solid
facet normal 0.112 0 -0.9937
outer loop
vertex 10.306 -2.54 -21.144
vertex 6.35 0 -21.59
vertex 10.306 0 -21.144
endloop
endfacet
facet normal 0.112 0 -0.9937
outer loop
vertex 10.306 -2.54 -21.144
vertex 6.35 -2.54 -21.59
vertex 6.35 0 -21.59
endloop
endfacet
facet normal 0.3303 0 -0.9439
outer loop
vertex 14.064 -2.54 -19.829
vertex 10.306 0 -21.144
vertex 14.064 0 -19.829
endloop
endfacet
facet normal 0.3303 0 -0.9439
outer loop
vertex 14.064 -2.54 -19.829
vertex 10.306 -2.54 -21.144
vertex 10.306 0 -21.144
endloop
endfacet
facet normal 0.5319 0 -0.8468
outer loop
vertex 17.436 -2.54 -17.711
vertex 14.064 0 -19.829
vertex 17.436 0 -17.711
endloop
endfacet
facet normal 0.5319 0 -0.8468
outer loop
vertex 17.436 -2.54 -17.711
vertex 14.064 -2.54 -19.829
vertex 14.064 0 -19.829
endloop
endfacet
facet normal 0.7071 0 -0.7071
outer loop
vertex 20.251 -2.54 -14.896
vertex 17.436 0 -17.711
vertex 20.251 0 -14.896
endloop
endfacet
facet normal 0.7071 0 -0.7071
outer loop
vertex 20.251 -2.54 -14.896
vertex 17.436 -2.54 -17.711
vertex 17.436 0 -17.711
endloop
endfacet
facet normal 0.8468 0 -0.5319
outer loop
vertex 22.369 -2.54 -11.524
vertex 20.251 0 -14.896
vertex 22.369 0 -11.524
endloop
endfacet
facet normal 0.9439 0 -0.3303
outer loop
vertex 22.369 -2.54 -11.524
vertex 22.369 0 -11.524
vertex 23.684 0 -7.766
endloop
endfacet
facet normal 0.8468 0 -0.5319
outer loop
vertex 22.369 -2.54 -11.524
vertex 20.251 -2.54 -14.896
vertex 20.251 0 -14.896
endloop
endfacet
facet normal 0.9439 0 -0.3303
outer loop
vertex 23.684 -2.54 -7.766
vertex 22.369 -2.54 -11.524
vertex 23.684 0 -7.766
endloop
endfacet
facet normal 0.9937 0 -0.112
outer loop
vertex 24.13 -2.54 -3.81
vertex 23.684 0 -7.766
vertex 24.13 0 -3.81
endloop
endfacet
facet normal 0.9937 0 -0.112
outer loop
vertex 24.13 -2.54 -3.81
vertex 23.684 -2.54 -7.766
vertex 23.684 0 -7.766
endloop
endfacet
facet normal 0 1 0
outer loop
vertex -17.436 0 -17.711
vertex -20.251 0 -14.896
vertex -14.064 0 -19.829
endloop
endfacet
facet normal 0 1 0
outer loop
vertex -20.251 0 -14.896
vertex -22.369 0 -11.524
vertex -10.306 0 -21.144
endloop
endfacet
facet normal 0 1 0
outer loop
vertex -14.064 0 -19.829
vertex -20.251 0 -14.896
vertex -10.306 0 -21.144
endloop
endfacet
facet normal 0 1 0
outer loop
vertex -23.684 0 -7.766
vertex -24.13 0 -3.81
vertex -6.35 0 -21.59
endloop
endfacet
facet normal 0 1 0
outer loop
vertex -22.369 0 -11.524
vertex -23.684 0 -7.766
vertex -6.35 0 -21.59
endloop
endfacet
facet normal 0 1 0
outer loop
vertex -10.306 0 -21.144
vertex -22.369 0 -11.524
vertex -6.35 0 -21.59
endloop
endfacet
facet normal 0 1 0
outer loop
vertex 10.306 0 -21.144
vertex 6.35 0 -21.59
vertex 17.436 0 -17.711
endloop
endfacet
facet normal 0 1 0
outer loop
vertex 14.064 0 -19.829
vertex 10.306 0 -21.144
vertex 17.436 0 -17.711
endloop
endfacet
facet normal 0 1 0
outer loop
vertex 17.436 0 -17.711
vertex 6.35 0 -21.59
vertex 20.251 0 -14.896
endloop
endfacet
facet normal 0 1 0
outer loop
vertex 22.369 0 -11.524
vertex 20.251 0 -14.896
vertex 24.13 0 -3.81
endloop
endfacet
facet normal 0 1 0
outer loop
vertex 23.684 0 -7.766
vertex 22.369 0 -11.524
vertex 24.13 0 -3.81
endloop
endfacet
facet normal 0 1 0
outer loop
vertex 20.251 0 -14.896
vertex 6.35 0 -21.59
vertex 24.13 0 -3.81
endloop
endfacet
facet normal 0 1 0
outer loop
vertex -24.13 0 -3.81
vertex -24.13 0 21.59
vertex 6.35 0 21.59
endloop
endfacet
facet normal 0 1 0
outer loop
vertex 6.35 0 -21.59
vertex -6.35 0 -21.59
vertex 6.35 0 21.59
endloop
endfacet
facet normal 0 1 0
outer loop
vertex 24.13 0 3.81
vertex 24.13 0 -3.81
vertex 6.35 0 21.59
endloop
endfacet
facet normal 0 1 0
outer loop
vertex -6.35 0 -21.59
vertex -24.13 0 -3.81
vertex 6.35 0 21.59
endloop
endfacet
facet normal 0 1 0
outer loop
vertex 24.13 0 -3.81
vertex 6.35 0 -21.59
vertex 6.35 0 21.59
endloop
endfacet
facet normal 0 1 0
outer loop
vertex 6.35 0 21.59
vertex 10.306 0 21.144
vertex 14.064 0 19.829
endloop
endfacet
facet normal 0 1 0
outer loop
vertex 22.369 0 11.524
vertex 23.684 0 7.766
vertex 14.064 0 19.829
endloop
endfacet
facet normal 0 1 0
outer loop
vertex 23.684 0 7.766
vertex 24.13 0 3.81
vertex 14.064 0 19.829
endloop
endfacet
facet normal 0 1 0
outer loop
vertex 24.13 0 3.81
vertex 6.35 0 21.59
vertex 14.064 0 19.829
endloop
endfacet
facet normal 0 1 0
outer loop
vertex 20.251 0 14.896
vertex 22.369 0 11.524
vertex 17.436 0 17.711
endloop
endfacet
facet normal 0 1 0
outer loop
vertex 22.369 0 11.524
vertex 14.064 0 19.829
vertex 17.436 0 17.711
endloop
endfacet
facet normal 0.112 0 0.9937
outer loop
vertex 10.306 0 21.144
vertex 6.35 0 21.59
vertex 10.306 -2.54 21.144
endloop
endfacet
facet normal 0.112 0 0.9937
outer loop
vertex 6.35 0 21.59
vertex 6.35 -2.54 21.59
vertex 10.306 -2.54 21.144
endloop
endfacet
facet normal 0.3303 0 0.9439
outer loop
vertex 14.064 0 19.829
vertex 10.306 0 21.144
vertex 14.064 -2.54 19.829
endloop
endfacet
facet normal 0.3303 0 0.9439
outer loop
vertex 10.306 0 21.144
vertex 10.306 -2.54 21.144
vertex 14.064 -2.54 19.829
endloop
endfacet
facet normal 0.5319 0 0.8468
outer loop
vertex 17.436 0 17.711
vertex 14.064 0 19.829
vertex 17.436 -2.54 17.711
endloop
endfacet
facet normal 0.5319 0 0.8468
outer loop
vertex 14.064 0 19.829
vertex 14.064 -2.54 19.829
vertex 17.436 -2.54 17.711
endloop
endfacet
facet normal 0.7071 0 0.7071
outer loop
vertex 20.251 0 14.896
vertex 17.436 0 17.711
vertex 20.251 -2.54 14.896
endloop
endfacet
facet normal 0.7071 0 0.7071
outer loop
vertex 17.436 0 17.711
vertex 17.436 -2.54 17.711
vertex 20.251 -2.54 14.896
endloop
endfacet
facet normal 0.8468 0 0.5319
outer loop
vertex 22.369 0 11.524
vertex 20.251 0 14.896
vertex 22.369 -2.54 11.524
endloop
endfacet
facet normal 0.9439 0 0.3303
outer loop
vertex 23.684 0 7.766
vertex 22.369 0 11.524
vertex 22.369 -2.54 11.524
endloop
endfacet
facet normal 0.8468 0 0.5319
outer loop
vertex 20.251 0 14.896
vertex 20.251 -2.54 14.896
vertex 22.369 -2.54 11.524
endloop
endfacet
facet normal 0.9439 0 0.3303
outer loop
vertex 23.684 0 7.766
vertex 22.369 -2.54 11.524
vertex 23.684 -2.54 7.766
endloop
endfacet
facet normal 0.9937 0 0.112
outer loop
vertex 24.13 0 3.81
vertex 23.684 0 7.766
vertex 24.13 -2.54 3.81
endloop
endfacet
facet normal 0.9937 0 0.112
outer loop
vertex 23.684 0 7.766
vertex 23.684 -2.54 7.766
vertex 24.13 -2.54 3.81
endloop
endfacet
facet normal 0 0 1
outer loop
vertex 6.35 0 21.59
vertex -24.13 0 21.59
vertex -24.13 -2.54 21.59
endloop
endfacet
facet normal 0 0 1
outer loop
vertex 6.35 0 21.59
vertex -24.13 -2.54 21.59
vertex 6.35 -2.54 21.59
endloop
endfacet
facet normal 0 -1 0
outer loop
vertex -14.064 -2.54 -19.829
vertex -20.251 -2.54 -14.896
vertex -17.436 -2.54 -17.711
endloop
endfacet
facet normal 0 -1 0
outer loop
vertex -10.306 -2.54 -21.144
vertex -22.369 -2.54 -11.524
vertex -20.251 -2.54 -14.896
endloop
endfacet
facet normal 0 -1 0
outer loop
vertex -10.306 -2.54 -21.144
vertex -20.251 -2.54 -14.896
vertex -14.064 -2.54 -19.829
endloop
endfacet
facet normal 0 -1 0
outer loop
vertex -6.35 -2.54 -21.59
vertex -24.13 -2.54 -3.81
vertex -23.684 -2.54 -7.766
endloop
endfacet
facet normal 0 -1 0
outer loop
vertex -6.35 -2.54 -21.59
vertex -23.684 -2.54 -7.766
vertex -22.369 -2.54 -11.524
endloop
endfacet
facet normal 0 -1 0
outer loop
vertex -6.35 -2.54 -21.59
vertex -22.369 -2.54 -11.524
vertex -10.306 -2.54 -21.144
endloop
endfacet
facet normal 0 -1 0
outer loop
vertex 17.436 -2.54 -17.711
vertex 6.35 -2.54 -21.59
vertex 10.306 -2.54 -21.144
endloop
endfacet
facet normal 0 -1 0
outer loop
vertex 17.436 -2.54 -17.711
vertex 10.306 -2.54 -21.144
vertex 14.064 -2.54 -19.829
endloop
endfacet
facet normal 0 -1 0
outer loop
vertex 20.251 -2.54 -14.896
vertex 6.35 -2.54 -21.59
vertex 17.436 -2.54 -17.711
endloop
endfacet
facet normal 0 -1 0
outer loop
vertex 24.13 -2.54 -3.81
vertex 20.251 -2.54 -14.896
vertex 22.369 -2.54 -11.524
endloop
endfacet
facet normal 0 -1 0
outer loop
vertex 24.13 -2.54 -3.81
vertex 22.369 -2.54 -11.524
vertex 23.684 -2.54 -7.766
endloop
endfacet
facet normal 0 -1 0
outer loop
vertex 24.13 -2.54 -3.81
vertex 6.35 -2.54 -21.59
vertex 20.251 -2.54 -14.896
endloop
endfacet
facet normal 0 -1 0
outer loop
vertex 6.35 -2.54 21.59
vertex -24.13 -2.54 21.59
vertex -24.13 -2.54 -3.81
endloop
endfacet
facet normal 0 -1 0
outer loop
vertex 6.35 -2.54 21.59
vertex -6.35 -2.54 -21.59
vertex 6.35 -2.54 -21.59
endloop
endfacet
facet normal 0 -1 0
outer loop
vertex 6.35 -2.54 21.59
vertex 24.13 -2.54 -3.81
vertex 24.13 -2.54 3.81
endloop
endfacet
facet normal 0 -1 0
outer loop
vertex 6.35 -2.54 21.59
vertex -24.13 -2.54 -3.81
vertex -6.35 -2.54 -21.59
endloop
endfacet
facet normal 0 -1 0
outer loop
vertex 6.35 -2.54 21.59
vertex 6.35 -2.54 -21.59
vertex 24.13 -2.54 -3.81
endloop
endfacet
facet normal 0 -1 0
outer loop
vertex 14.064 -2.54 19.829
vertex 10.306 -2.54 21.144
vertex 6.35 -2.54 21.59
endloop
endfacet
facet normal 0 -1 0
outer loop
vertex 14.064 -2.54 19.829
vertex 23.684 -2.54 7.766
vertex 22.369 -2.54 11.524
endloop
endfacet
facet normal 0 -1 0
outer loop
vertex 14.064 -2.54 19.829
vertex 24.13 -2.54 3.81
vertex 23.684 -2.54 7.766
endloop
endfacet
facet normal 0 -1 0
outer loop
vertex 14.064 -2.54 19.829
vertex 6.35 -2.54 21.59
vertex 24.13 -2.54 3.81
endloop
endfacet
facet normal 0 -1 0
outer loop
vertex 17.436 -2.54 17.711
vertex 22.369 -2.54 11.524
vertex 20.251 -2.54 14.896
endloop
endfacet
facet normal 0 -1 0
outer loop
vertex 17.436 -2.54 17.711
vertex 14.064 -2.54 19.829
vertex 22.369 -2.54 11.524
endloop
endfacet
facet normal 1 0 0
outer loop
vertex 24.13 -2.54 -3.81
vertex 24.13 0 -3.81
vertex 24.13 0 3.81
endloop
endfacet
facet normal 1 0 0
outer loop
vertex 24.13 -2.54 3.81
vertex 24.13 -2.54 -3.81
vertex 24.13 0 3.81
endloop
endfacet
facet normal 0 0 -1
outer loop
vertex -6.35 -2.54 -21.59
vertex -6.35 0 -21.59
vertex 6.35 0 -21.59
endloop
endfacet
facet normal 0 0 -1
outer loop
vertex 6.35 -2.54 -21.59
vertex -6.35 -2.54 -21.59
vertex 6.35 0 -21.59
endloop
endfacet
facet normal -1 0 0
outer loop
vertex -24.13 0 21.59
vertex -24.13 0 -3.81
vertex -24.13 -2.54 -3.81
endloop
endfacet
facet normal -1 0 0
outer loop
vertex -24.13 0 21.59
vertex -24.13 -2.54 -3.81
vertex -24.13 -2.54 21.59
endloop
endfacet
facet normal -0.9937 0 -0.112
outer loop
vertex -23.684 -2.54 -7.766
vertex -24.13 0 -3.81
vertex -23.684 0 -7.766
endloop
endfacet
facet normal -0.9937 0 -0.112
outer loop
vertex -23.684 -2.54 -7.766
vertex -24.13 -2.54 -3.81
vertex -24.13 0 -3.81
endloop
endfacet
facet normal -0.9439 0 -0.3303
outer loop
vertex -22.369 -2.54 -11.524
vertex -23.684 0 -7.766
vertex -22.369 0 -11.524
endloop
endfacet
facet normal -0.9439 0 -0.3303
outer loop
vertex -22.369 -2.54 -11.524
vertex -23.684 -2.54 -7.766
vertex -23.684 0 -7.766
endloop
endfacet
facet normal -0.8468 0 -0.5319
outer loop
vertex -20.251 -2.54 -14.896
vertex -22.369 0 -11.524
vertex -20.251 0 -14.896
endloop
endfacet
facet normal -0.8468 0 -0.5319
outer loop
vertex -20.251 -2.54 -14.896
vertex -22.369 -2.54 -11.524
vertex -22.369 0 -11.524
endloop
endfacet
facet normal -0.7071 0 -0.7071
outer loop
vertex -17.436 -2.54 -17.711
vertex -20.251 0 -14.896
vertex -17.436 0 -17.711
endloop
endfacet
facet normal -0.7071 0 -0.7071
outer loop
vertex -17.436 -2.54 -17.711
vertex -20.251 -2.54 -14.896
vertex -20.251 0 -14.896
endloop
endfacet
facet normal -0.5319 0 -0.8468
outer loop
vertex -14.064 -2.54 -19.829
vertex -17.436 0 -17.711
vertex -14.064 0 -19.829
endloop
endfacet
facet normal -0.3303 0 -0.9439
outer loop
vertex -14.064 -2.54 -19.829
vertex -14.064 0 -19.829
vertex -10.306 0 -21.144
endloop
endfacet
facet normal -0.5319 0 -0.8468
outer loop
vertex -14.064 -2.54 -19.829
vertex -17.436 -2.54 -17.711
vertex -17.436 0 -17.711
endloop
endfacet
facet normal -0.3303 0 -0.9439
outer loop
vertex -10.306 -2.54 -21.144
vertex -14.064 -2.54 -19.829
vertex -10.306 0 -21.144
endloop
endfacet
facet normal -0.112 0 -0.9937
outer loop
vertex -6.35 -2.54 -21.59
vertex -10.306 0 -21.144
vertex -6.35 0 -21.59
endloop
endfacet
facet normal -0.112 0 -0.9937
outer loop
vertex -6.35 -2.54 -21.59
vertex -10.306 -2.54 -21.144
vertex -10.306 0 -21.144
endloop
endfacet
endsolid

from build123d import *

# Parameters (mm, degrees)
F0_W     = 48.26
F0_H     = 43.18
F1_DEPTH = 2.54
F2_R     = 17.78
F3_R     = 17.78


with BuildPart() as f1:
    # F0 (on Front) → F1 (new body)
    with BuildSketch(Plane.XZ):
        Rectangle(F0_W, F0_H)
    extrude(amount=F1_DEPTH)

    # F2
    f2_edges = [f1.edges().sort_by_distance(p)[0] for p in [
        (24.13, -1.27, -21.59),
        (-24.13, -1.27, -21.59),
    ]]
    fillet(f2_edges, radius=F2_R)

    # F3
    f3_edges = [f1.edges().sort_by_distance(p)[0] for p in [
        (24.13, -1.27, 21.59),
    ]]
    fillet(f3_edges, radius=F3_R)


solid = f1.part
